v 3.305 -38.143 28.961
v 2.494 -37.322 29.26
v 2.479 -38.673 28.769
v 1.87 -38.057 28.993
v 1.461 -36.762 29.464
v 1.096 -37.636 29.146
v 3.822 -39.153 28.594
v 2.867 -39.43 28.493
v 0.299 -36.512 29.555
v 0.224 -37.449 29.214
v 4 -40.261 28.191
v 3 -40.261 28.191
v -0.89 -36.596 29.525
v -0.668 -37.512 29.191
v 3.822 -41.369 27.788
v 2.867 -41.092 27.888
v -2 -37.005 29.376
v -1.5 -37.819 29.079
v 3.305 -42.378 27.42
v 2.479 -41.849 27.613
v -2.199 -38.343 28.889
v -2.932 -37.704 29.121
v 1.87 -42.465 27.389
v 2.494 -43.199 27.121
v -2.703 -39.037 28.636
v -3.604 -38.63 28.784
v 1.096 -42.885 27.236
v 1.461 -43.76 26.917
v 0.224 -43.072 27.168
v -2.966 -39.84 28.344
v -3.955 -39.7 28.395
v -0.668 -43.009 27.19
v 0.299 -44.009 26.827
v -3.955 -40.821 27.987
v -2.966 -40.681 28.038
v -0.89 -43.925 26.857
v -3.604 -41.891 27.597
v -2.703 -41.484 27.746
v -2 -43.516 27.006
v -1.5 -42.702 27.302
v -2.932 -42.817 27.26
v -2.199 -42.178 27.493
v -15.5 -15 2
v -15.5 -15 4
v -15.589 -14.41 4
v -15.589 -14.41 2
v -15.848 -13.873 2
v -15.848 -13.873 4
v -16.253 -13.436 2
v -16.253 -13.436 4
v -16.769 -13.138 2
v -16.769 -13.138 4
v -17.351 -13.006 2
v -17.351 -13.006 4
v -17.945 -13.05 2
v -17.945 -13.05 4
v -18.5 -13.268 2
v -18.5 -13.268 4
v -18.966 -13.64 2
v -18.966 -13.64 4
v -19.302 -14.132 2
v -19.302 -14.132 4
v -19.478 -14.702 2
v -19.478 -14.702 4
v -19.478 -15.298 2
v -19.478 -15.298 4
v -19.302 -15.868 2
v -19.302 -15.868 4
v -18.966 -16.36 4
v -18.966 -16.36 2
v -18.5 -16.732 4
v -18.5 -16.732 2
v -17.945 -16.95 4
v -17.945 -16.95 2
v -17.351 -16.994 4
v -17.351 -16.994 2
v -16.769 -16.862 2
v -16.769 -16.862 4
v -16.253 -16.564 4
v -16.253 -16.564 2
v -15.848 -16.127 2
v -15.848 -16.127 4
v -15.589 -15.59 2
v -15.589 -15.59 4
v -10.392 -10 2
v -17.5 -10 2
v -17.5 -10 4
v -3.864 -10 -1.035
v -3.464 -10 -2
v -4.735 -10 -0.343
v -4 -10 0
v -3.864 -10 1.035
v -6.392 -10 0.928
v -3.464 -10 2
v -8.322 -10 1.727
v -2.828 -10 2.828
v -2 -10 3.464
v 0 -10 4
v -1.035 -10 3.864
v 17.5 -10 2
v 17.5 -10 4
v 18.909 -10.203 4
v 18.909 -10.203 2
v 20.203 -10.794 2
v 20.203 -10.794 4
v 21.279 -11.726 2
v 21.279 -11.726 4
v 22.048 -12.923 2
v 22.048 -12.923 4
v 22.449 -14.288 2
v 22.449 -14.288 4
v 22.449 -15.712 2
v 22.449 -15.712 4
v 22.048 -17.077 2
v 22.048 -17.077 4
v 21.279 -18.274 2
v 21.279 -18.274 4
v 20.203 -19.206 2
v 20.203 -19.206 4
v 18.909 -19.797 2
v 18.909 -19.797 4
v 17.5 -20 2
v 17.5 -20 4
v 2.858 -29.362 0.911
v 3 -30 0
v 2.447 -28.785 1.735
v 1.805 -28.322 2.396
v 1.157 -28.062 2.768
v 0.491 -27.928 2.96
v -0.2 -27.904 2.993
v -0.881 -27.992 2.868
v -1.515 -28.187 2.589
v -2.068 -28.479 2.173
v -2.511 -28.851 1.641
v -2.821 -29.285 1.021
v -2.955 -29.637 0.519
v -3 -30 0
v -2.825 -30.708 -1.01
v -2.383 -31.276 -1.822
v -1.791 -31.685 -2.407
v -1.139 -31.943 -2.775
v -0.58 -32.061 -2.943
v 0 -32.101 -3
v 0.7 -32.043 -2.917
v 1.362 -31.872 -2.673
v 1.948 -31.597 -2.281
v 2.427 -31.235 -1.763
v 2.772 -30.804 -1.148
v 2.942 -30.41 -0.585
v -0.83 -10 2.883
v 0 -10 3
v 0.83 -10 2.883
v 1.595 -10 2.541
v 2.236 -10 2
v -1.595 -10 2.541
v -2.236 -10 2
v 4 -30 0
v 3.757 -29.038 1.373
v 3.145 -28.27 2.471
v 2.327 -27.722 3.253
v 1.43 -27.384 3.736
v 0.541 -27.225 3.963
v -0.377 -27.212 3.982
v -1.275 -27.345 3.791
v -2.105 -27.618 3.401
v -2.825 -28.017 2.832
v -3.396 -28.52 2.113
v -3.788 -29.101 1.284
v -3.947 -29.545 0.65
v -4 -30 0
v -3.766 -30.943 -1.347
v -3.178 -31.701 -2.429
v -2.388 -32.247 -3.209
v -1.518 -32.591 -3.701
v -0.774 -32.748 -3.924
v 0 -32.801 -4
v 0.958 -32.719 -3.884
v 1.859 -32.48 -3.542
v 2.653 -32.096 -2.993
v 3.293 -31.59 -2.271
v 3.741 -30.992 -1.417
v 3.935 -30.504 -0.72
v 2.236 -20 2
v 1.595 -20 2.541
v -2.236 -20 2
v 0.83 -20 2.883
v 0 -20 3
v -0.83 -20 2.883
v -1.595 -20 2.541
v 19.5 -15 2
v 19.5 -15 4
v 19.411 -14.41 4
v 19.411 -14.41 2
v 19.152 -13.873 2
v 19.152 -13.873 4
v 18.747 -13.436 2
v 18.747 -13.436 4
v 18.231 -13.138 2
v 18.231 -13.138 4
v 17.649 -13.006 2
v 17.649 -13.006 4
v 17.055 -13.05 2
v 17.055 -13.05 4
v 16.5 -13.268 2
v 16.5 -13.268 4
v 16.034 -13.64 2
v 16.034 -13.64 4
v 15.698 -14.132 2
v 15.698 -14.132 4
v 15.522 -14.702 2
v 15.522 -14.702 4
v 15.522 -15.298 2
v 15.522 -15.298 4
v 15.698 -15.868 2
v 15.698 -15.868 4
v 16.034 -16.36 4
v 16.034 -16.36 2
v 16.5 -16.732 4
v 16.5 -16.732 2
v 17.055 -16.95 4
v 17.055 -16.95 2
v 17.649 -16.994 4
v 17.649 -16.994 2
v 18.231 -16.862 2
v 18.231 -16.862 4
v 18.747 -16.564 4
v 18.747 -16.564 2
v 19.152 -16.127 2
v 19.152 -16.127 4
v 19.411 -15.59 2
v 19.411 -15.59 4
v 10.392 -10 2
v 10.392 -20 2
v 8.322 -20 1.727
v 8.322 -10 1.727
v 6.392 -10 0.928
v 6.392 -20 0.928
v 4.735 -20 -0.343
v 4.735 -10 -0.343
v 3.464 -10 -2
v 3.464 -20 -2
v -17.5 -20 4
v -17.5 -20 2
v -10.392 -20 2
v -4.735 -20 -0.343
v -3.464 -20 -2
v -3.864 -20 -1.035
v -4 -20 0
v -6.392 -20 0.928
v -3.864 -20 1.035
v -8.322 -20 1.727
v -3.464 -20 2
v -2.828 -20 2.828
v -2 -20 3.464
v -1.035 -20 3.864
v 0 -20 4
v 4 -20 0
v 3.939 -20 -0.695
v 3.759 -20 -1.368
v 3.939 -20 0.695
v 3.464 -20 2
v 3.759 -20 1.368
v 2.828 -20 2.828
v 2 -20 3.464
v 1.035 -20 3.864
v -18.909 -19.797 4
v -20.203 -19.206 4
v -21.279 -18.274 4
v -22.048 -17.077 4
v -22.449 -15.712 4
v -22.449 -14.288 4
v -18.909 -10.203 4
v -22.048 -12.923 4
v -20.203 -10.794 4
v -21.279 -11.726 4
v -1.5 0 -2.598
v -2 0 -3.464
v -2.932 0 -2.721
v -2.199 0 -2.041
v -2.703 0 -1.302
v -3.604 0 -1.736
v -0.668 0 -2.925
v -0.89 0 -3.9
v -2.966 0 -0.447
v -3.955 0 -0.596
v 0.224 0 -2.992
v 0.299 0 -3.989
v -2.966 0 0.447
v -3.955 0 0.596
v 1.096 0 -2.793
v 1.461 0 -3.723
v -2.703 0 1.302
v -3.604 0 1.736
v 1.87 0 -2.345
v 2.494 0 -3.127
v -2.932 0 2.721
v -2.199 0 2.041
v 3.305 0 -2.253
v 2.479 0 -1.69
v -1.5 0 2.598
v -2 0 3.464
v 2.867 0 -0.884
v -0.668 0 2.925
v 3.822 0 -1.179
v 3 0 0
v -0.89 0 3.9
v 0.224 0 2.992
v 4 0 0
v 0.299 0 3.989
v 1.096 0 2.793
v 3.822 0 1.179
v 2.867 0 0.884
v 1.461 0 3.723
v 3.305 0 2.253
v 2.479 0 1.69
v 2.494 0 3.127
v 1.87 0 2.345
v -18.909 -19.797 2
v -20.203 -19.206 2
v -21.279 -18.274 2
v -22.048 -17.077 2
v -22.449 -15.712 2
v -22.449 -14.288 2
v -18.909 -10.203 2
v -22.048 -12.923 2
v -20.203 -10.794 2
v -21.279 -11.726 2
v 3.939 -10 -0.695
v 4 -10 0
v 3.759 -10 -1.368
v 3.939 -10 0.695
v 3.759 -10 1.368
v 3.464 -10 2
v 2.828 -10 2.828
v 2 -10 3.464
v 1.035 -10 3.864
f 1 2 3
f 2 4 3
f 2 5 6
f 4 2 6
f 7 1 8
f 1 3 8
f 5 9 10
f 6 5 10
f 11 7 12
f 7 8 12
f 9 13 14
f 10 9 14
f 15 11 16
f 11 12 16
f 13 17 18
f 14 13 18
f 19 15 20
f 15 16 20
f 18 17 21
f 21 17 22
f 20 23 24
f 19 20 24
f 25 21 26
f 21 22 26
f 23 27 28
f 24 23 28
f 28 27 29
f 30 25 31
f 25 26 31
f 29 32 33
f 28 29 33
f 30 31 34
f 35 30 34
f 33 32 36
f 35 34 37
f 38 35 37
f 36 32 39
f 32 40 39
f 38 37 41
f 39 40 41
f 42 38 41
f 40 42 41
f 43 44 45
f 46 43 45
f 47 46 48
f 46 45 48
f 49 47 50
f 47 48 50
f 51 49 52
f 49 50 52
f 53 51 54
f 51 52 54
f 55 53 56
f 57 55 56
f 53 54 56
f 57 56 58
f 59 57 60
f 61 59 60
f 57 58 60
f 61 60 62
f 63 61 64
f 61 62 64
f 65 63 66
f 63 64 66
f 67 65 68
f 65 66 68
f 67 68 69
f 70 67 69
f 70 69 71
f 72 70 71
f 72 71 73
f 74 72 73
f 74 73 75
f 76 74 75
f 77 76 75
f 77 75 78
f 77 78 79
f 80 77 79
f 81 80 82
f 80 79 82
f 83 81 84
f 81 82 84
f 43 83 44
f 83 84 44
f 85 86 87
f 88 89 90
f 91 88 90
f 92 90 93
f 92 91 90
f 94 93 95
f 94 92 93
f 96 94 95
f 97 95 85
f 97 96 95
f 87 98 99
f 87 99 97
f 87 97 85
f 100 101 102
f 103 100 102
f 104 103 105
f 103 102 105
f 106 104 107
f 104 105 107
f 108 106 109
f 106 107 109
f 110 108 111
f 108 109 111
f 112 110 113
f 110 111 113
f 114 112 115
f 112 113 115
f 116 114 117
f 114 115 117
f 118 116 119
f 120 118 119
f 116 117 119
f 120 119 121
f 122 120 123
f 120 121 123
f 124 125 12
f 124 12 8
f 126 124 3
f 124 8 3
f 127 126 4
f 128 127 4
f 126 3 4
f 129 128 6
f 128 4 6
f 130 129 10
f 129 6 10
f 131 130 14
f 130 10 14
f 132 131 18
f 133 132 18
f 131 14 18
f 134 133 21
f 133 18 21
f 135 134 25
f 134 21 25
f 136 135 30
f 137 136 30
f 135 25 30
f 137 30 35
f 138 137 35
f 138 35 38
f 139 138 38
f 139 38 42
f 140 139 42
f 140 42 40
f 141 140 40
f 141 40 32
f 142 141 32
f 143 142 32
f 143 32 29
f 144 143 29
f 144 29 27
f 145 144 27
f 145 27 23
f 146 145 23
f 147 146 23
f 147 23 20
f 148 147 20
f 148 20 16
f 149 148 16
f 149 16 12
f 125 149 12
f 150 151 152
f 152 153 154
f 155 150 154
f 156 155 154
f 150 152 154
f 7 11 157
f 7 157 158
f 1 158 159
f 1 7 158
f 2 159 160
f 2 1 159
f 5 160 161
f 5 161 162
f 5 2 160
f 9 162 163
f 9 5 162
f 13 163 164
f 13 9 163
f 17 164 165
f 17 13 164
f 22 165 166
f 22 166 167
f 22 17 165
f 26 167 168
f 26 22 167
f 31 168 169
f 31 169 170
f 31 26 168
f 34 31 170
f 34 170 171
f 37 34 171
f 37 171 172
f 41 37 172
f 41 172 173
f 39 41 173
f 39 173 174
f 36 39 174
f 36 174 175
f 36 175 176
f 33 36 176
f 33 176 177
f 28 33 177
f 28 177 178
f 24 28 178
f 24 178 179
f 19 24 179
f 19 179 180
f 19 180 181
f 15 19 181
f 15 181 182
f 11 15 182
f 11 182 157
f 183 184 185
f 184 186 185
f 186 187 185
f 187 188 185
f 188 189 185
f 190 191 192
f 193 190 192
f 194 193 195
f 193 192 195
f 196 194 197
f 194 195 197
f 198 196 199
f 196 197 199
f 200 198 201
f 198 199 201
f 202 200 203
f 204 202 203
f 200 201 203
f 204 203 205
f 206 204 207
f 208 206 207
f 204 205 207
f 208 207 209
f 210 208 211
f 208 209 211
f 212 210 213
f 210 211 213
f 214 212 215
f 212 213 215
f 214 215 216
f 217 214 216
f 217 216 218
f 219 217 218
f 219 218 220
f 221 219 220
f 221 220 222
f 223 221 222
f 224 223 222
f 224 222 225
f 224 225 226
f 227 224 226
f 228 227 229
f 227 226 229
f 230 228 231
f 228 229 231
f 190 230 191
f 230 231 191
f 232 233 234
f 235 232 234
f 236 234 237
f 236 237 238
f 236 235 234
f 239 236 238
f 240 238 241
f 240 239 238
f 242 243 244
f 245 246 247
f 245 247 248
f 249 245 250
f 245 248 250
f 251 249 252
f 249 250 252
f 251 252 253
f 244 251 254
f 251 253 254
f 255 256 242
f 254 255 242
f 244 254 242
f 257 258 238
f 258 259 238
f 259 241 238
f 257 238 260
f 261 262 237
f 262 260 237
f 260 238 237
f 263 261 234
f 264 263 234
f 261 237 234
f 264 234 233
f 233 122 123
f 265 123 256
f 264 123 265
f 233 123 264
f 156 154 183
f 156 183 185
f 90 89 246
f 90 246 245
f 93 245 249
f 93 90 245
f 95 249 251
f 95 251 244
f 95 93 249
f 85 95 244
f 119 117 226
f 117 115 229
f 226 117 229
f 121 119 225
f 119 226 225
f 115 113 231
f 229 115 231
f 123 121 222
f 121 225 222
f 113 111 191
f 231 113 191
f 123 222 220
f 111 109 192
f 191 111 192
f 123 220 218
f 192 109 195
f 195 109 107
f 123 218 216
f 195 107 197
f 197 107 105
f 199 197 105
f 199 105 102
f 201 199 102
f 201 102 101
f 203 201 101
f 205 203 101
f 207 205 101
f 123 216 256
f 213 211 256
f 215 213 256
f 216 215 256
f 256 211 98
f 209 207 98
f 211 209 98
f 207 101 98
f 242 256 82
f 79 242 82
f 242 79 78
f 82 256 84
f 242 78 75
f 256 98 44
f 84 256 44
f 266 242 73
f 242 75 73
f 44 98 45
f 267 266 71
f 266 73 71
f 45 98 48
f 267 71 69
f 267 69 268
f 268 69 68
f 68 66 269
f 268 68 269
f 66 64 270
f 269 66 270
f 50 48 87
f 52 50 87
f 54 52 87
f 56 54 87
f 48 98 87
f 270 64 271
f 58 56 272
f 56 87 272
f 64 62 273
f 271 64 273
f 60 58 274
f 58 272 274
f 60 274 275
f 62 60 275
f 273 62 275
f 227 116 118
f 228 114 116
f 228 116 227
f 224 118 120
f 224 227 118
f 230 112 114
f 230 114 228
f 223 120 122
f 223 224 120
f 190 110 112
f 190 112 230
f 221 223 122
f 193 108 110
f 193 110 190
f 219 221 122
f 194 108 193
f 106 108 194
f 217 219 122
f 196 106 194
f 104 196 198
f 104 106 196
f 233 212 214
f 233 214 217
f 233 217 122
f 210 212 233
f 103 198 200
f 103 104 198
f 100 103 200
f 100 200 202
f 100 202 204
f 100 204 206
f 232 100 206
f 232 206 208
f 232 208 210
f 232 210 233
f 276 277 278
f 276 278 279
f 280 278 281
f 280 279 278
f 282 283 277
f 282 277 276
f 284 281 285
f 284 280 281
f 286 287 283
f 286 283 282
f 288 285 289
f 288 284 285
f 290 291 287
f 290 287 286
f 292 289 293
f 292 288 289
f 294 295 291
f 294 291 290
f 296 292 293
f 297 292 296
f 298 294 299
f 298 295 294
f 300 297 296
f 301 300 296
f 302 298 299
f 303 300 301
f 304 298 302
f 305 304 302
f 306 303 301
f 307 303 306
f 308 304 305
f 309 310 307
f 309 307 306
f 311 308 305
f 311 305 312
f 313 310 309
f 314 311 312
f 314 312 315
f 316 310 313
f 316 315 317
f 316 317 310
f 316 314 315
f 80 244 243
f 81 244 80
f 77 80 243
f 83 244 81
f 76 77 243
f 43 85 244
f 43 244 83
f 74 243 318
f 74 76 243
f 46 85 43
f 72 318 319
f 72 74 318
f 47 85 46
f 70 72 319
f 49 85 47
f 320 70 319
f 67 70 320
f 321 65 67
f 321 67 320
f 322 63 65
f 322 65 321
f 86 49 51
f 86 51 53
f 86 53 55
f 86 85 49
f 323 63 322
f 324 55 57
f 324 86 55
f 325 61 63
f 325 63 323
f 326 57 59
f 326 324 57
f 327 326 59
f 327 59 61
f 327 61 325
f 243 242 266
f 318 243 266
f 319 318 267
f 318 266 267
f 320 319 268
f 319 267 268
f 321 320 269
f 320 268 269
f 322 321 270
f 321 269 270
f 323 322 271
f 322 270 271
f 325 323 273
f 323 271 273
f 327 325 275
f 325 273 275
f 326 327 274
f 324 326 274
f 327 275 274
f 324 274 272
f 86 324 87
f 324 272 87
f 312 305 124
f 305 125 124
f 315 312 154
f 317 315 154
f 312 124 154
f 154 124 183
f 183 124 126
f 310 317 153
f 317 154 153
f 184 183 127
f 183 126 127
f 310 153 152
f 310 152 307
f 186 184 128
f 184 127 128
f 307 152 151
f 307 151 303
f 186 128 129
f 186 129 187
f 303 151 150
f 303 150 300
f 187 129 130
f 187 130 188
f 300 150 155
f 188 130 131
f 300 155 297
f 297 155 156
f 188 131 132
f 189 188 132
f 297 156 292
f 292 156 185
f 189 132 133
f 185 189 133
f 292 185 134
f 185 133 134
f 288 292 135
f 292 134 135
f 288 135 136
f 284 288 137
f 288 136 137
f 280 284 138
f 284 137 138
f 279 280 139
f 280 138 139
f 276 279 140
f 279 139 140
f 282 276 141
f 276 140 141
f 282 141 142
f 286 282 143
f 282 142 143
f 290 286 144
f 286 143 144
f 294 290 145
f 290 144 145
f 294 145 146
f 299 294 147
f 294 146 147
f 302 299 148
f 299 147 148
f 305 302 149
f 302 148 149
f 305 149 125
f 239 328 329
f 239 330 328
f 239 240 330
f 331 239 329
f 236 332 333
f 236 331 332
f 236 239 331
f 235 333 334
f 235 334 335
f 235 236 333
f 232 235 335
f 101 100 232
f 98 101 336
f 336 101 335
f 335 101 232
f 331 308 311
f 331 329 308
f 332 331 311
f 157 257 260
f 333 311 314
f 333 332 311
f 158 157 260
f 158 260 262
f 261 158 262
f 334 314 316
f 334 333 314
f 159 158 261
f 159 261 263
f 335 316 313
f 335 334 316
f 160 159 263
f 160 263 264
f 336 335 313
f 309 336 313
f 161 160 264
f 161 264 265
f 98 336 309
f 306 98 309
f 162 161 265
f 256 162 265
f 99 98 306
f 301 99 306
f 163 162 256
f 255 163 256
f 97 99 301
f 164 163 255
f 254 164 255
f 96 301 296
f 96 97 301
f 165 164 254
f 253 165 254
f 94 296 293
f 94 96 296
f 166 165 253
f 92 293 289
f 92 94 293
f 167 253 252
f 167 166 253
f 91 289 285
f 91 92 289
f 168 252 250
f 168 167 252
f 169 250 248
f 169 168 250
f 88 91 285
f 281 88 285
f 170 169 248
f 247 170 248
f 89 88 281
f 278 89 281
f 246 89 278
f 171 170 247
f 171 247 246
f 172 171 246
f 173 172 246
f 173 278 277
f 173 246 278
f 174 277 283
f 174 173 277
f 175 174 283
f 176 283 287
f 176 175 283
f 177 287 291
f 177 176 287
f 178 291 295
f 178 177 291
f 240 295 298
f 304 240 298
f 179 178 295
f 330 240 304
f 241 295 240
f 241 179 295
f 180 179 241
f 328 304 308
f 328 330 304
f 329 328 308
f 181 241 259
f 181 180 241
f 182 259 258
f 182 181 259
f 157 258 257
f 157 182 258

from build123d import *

# Parameters (mm, degrees)
SKETCH1_R           = 4
SKETCH1_R_2         = 3
SKETCH3_R           = 2
BOSS_EXTRUDE1_DEPTH = 2
FILLET1_R           = 8


with BuildPart() as part:
    # Sweep1: sweep along a path in Sketch2
    with BuildLine(Plane(origin=(0, 0, 0), x_dir=(0, 0, -1), z_dir=(1, 0, 0))) as sweep1_path:
        Line((0, 0), (0, -30))
        Line((0, -30), (-28.190778624, -40.2606043))
    # Sketch1 → Sweep1 (sweep)
    with BuildSketch(Plane(origin=(0, 0, 0), x_dir=(1, 0, 0), z_dir=(0, 1, 0))):
        Circle(SKETCH1_R)
        Circle(SKETCH1_R_2, mode=Mode.SUBTRACT)
    sweep(path=sweep1_path.line, transition=Transition.RIGHT)

    # Sketch3 → Boss-Extrude1 (add)
    with BuildSketch(Plane.XY.offset(4)):
        with BuildLine():
            Line((17.5, -20), (-17.5, -20))
            ThreePointArc((-17.5, -20), (-22.5, -15), (-17.5, -10))
            Line((-17.5, -10), (17.5, -10))
            ThreePointArc((17.5, -10), (22.5, -15), (17.5, -20))
        make_face()
        with Locations((17.5, -15)):
            Circle(SKETCH3_R, mode=Mode.SUBTRACT)
        with Locations((-17.5, -15)):
            Circle(SKETCH3_R, mode=Mode.SUBTRACT)
    extrude(amount=-BOSS_EXTRUDE1_DEPTH)

    # Fillet1
    # the kernel refuses this fillet: 8 mm, written as the material it adds along each edge
    with BuildSketch(Plane(origin=(-3.464101615, -10, 2), x_dir=(0, 0, -1), z_dir=(0, -1, 0))) as fillet1_piece_1:
        with BuildLine():
            CenterArc((8, -6.92820323), FILLET1_R, 120, 60)
            Line((0, -6.92820323), (0, 0))
            ThreePointArc((0, 0), (2, -0.535898385), (4, 0))
        make_face()
    extrude(amount=10)
    with BuildSketch(Plane(origin=(3.464101615, -10, 2), x_dir=(0, 0, -1), z_dir=(0, -1, 0))) as fillet1_piece_2:
        with BuildLine():
            CenterArc((8, 6.92820323), FILLET1_R, 180, 60)
            Line((0, 6.92820323), (0, 0))
            ThreePointArc((0, 0), (2, 0.535898385), (4, 0))
        make_face()
    extrude(amount=10)


solid = part.part
